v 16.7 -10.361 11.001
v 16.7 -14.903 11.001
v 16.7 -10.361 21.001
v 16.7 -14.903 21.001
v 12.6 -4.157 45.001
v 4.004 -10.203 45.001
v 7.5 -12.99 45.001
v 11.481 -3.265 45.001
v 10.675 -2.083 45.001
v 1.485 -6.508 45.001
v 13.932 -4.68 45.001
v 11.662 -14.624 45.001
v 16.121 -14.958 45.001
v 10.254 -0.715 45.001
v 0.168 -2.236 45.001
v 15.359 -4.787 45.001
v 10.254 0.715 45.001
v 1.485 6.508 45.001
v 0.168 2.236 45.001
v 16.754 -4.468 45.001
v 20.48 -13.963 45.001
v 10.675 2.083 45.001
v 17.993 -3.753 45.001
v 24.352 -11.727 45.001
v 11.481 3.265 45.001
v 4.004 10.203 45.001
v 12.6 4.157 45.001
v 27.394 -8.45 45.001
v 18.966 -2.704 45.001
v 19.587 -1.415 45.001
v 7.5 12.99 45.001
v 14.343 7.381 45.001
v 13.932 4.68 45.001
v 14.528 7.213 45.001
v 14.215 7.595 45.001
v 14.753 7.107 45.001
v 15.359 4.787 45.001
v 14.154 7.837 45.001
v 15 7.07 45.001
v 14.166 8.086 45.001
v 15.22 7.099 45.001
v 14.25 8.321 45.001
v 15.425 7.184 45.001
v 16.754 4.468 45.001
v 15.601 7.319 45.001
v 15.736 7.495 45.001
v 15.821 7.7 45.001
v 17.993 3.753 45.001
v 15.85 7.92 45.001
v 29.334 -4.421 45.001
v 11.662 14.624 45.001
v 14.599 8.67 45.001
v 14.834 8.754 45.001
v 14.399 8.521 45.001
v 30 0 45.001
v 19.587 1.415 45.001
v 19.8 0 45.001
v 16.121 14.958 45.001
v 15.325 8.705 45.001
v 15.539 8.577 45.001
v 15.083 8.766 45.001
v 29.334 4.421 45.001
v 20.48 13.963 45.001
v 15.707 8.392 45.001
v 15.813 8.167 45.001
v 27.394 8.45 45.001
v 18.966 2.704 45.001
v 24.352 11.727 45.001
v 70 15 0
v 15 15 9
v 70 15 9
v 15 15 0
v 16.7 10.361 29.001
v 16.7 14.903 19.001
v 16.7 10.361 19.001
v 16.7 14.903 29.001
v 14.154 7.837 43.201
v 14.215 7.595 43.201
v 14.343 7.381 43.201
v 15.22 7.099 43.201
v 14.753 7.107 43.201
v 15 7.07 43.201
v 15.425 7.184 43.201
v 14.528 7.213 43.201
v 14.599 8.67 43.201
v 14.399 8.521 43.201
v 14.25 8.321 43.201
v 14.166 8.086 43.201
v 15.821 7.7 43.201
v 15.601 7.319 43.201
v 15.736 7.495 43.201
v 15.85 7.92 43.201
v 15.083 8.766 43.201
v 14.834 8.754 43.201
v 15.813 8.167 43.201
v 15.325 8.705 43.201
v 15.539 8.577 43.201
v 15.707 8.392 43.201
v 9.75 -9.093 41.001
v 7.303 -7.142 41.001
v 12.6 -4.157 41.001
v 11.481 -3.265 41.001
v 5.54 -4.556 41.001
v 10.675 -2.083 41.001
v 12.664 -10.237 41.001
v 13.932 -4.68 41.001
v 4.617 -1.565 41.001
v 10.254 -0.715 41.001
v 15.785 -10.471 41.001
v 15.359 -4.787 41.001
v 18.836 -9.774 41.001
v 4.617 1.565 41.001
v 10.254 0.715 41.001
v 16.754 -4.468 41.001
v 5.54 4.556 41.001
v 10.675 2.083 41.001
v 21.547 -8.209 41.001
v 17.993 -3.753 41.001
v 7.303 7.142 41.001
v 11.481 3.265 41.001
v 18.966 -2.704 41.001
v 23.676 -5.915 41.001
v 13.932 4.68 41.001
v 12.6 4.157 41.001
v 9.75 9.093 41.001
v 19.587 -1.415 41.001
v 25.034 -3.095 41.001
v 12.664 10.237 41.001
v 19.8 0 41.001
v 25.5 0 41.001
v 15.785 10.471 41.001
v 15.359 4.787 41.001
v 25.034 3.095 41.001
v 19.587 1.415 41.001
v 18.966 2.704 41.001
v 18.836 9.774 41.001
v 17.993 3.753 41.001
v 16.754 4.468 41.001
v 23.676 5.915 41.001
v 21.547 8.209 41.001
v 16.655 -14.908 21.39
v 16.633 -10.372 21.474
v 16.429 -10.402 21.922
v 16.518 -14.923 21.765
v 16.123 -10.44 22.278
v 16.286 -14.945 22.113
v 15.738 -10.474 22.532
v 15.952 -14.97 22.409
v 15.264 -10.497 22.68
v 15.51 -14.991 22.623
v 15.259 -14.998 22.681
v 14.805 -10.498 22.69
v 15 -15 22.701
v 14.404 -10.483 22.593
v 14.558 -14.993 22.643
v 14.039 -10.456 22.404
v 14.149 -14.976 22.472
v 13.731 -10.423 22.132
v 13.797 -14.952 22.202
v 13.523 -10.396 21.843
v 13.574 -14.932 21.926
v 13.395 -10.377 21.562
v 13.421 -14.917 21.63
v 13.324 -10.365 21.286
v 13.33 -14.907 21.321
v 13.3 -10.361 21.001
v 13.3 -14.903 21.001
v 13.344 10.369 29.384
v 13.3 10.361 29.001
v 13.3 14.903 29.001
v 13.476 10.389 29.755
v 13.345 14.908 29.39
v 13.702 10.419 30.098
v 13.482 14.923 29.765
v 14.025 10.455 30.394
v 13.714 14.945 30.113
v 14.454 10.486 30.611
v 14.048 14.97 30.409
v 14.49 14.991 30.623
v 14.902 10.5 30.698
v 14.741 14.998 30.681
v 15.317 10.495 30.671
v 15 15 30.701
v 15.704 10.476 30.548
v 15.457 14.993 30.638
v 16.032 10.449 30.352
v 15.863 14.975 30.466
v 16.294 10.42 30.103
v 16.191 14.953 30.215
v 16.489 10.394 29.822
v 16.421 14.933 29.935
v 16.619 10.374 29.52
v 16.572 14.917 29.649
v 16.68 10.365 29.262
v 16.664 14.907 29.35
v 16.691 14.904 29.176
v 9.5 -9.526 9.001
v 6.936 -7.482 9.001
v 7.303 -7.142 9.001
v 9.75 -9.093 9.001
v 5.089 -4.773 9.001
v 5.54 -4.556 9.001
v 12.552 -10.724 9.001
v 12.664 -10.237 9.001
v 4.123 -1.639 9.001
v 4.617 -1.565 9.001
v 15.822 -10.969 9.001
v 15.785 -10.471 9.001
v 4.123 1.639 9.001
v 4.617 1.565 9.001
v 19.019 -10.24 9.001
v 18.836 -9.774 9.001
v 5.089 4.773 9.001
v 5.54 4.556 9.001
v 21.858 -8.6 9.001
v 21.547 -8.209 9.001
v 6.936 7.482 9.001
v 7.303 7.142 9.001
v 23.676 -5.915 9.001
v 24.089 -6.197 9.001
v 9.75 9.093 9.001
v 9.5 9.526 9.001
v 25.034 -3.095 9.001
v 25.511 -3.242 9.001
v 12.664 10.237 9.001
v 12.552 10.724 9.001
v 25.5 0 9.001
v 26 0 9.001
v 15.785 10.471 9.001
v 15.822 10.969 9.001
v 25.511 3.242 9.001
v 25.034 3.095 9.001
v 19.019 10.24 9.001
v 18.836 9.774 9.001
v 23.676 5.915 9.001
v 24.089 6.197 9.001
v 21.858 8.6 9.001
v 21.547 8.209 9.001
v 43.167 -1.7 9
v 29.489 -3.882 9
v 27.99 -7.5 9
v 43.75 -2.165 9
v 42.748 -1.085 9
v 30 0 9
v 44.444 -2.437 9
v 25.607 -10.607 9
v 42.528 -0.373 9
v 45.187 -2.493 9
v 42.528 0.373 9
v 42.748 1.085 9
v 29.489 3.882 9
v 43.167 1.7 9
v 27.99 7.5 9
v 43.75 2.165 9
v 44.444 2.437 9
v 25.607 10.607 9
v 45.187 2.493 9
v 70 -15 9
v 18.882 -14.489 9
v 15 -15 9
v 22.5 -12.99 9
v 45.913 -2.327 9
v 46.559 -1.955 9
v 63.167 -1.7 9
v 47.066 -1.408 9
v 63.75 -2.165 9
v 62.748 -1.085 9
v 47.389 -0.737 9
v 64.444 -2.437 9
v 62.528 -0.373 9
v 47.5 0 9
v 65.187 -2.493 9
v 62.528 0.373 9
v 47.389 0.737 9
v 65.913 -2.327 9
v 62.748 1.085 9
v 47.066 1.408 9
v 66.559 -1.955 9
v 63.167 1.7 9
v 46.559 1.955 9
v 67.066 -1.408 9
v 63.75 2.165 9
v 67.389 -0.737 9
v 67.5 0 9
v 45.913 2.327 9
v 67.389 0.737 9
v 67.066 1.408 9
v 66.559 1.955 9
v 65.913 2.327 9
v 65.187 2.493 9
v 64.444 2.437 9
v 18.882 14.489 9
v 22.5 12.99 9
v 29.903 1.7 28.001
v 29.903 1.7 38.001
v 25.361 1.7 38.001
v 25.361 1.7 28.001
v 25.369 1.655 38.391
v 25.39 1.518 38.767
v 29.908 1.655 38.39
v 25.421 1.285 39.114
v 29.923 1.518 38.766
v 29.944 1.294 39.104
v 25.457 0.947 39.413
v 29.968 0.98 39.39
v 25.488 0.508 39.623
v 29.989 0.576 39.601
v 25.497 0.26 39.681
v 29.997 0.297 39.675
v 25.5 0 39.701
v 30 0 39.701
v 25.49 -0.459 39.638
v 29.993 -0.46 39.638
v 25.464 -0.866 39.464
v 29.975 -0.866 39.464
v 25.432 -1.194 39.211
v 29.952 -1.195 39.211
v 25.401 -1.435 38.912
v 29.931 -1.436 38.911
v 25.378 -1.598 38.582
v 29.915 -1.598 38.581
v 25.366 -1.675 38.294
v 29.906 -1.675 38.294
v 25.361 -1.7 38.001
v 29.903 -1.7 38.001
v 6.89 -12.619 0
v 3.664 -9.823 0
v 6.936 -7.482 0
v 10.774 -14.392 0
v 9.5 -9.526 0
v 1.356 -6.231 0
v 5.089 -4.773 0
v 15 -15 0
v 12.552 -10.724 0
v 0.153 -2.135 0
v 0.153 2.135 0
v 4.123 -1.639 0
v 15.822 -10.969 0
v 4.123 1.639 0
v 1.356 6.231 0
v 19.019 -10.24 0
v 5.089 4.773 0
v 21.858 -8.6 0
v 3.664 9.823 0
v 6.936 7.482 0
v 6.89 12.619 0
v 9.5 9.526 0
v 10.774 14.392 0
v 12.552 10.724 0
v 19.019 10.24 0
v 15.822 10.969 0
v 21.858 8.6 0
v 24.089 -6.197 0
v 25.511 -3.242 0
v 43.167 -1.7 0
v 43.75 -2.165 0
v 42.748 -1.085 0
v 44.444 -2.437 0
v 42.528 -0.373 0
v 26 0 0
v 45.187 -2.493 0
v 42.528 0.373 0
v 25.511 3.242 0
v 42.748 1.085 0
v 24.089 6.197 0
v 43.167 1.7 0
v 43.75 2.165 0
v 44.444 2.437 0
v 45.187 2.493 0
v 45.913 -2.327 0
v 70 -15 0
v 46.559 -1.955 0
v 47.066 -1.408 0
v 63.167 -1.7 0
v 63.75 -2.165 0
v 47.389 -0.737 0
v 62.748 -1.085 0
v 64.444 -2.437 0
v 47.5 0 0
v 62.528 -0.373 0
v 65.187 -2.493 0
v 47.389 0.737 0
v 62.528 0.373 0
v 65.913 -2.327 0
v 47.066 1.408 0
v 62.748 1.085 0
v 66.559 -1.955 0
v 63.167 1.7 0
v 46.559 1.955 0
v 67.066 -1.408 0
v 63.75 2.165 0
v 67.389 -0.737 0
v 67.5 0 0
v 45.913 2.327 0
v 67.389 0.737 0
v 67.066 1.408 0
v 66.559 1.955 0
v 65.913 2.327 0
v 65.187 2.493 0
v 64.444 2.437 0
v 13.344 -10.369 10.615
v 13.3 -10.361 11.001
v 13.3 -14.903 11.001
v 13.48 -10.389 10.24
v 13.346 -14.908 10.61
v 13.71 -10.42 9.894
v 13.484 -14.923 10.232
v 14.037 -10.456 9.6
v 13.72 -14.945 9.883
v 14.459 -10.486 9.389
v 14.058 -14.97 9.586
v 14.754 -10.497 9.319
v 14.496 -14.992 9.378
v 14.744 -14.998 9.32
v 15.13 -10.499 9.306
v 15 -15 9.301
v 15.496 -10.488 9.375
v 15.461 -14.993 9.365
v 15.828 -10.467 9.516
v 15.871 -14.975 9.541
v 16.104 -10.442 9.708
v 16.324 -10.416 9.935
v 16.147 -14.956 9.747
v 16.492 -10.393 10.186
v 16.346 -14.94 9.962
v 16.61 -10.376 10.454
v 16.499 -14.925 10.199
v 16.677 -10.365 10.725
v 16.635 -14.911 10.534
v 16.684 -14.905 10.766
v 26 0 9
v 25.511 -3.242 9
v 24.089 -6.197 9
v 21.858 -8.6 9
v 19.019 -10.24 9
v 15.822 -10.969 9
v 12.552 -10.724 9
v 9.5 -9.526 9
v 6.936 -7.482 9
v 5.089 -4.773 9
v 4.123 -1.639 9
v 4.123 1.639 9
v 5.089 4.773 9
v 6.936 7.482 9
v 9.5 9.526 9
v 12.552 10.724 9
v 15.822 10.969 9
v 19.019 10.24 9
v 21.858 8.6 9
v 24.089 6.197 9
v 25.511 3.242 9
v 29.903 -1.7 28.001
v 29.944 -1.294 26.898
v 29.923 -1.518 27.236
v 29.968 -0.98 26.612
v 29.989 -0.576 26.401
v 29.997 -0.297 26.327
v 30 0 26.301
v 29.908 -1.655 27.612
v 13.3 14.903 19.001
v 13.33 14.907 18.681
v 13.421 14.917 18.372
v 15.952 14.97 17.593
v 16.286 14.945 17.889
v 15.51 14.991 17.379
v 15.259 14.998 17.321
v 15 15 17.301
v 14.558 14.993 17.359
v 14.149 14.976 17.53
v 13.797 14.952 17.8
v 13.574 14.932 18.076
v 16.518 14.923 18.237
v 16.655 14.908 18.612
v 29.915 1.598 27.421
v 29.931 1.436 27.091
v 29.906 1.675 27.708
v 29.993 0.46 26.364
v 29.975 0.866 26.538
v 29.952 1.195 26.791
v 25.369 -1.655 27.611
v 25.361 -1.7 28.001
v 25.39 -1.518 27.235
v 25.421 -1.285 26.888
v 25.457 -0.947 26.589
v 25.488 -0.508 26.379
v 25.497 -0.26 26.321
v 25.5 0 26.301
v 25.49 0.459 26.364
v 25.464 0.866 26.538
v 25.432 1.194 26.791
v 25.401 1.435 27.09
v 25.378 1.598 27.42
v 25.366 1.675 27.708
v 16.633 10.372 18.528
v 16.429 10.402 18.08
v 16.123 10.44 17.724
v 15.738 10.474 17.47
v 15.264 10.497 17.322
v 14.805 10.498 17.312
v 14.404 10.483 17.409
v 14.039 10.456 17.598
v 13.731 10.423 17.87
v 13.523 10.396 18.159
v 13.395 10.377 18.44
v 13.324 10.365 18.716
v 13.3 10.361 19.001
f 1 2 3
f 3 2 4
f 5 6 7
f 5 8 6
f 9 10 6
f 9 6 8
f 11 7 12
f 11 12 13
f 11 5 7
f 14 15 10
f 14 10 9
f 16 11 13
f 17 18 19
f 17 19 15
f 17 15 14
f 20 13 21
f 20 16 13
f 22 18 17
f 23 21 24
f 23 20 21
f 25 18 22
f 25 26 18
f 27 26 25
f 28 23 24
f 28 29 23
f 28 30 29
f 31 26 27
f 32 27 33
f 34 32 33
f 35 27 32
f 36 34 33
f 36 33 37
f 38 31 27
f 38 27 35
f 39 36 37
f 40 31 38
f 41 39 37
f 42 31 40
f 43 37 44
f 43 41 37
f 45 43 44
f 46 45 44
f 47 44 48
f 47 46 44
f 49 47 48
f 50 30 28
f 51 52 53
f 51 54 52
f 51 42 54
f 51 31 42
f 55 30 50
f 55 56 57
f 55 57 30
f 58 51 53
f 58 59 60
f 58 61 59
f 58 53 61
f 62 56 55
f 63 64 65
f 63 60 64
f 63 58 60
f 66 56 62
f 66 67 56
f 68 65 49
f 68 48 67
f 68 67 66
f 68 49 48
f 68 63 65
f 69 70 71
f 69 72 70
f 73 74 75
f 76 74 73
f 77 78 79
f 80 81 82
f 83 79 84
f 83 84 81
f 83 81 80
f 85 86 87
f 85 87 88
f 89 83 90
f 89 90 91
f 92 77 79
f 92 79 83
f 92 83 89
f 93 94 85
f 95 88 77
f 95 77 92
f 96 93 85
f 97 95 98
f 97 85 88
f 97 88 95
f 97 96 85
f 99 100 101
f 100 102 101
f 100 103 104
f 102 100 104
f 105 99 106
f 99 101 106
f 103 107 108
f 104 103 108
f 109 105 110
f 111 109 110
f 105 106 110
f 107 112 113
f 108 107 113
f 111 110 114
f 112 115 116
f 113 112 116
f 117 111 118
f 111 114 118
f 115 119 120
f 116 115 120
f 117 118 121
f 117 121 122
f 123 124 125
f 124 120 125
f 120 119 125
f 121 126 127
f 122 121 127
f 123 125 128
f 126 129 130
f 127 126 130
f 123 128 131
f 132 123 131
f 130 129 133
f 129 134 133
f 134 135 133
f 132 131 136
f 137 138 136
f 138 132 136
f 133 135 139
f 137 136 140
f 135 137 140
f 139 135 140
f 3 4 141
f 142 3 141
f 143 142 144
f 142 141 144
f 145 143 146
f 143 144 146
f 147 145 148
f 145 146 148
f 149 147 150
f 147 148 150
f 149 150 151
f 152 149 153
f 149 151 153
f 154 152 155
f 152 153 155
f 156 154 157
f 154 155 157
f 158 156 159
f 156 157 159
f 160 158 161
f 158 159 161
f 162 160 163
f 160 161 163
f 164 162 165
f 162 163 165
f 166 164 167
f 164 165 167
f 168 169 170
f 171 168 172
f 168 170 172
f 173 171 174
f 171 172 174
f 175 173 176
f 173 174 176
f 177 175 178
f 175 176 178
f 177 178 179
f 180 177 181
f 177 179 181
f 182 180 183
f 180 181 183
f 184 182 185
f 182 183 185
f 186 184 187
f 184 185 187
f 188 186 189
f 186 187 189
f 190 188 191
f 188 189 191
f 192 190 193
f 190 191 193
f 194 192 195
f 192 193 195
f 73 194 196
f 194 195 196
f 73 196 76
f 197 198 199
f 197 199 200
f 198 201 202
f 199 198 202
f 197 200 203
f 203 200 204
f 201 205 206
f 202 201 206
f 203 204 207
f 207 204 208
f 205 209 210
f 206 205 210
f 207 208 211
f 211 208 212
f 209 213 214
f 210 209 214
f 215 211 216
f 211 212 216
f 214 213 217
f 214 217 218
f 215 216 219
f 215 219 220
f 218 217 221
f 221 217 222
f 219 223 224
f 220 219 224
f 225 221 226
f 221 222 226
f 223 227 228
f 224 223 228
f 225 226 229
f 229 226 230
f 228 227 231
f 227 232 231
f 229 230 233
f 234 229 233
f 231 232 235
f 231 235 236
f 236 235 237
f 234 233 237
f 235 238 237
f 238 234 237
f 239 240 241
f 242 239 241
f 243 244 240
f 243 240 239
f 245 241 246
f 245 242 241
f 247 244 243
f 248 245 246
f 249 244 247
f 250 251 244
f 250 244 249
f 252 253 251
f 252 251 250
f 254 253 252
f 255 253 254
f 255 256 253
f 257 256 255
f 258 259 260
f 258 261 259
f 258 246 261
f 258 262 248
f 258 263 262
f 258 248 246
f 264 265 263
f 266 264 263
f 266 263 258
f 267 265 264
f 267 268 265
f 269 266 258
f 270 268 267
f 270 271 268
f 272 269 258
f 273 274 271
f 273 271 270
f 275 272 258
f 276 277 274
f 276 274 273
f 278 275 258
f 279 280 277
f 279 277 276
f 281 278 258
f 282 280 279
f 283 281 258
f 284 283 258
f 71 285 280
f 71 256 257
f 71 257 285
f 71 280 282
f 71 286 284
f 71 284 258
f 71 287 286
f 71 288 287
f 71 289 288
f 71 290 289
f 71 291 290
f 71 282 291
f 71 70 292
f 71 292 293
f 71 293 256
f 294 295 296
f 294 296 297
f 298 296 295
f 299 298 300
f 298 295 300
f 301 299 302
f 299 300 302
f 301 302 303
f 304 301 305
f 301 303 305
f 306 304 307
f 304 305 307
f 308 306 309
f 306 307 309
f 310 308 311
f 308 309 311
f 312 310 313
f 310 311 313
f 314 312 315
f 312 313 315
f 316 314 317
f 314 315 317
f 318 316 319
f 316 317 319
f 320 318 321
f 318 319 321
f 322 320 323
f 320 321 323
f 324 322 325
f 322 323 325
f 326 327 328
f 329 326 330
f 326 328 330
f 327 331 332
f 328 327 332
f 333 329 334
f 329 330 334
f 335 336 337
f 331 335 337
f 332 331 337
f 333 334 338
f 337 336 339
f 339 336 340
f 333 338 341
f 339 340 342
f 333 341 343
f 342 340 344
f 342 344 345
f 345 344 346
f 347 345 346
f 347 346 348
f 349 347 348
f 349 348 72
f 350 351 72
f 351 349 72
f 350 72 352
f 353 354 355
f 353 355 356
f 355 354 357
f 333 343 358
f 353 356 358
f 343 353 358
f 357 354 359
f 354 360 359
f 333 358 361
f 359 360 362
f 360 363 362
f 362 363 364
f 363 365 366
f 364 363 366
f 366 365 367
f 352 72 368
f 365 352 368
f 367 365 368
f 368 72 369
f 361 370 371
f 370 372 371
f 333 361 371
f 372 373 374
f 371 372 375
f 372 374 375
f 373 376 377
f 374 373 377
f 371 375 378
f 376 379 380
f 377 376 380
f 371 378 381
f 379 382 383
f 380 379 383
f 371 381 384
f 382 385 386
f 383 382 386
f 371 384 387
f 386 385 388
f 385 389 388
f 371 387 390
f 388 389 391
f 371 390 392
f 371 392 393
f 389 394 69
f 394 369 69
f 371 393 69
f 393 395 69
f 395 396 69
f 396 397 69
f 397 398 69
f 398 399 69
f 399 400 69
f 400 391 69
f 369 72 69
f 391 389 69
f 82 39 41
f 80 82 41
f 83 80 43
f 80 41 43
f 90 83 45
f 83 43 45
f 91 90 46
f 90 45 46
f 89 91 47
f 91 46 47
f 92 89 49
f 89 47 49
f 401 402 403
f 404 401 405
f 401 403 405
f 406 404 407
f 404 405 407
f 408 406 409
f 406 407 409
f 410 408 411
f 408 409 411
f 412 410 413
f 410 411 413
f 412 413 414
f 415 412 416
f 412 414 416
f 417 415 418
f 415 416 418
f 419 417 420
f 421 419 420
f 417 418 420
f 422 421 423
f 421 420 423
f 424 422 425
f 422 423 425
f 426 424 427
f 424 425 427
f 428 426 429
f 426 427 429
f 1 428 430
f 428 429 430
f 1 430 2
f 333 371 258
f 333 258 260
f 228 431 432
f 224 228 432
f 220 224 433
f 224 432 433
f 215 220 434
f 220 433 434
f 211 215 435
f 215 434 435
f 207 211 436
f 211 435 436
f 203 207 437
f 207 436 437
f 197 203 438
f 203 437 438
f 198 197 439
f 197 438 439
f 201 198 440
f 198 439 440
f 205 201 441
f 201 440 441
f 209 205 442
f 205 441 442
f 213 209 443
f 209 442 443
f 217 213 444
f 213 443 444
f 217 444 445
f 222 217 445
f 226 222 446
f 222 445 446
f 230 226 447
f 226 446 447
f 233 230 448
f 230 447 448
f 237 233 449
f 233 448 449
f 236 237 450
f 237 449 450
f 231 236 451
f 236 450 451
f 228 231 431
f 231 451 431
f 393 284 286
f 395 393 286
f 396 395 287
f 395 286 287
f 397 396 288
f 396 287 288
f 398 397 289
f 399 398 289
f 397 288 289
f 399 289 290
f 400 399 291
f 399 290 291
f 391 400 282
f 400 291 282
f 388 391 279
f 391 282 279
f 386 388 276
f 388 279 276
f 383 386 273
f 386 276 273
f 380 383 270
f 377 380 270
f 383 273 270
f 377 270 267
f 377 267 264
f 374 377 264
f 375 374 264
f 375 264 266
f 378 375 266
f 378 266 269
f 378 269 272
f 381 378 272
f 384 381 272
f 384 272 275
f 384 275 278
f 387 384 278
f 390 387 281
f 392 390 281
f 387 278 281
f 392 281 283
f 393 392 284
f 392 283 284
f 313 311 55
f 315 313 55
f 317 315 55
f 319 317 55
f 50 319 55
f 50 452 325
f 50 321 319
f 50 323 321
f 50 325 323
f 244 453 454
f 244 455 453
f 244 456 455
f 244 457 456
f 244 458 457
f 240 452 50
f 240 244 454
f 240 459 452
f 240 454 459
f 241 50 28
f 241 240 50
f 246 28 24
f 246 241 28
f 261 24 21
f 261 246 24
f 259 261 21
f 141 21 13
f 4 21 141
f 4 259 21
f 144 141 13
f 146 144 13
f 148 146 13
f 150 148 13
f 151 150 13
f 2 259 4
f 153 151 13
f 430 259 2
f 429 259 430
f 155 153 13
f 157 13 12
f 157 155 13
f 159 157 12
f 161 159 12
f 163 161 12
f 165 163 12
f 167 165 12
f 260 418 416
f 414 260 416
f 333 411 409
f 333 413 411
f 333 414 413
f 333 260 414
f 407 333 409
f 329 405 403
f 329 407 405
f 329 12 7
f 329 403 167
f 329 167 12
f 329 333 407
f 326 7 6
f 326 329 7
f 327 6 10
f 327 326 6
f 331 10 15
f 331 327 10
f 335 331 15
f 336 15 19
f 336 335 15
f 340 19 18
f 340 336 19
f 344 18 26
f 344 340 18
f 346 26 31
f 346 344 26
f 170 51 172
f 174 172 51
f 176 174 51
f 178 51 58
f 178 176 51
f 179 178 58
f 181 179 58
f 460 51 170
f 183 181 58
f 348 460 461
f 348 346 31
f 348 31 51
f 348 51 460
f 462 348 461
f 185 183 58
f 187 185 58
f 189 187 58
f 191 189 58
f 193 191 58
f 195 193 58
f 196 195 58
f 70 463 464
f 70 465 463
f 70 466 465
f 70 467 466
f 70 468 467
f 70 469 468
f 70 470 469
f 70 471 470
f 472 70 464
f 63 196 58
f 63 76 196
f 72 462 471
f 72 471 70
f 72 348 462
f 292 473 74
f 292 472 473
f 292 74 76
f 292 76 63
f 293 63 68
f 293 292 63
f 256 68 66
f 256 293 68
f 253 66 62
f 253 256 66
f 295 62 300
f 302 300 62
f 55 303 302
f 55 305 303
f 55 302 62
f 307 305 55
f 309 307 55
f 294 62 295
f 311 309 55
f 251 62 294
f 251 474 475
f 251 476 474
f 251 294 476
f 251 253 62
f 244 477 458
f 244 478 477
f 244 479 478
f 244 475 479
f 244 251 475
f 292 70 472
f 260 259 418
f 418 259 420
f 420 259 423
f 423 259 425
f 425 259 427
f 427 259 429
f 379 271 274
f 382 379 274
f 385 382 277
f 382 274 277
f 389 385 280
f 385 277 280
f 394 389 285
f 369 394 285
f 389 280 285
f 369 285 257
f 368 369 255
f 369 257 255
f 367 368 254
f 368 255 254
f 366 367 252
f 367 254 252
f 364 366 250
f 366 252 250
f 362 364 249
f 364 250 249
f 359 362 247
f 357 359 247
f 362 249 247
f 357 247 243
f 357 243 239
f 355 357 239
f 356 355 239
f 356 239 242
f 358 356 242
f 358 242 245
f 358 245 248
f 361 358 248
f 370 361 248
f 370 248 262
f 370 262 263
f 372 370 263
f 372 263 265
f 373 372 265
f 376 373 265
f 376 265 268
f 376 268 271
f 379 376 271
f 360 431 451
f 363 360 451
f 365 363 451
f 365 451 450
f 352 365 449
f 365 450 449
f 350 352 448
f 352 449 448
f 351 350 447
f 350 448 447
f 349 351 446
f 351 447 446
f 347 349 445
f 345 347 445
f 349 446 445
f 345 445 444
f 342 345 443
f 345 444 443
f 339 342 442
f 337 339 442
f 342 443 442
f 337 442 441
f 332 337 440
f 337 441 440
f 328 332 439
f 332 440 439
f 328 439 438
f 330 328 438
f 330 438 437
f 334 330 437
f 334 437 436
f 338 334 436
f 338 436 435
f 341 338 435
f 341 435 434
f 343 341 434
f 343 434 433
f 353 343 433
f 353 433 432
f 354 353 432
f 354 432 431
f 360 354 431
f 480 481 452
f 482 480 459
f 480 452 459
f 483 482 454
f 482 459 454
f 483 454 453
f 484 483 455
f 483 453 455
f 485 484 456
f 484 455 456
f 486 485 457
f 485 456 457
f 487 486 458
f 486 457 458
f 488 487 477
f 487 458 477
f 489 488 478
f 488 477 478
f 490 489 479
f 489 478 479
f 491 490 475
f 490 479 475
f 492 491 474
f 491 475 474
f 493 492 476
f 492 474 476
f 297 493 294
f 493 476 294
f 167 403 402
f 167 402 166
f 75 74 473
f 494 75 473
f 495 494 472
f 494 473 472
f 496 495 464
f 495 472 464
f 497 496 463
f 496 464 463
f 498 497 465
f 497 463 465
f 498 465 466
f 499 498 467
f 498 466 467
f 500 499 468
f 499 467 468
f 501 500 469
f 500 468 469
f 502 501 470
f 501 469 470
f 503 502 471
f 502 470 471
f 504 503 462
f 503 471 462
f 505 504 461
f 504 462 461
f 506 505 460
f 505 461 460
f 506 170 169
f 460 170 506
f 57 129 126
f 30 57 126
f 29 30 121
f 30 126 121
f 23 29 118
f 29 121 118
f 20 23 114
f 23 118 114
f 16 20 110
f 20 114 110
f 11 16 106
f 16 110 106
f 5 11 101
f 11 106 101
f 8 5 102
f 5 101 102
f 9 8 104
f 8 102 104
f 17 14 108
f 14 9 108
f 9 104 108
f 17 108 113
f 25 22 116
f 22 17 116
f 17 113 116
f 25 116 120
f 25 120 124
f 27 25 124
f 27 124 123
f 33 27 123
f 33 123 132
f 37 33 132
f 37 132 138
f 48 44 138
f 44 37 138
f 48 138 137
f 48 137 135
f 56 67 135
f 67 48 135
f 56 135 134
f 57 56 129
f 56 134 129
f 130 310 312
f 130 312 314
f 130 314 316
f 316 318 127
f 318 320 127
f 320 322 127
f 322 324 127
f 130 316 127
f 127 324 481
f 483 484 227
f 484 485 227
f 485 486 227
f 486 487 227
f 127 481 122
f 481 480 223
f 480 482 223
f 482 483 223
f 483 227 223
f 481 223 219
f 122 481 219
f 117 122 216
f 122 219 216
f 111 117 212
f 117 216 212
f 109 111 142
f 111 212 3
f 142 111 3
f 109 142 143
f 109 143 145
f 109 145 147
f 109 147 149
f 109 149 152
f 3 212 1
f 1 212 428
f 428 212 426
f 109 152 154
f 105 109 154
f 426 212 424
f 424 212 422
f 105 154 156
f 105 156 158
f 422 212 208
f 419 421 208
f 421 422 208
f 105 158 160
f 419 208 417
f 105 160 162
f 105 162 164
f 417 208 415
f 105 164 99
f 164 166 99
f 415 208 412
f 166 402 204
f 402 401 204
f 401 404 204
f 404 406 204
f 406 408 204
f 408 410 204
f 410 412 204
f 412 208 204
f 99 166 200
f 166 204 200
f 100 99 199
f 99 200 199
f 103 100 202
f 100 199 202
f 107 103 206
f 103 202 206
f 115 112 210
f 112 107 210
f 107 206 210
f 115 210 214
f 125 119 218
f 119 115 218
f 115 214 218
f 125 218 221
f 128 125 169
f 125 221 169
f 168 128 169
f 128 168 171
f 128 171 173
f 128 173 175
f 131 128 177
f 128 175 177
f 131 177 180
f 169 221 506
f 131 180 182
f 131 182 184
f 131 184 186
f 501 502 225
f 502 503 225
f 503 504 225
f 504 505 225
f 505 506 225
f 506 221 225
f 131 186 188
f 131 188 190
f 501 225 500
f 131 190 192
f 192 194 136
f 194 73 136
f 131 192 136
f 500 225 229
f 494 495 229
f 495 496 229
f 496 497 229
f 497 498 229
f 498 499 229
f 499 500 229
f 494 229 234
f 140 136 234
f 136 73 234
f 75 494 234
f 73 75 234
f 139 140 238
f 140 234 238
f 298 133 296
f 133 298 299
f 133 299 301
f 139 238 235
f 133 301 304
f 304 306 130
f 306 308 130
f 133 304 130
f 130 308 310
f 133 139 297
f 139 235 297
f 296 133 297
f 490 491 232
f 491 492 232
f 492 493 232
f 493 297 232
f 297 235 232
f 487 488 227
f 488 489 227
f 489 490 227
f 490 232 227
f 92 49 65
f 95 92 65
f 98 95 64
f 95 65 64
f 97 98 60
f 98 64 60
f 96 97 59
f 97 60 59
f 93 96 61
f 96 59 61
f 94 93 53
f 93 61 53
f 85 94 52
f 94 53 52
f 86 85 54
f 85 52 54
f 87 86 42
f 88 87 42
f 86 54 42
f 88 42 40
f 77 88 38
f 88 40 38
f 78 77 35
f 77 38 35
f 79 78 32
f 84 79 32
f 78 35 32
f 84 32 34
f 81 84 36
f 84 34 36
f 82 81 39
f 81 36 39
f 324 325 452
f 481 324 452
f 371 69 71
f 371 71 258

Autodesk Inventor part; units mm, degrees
ref_plane "YZ Plane" through (0, 0, 0) normal (1, 0, 0) x (0, 1, 0)
ref_plane "XZ Plane" through (0, 0, 0) normal (0, 1, 0) x (-1, 0, 0)
ref_plane "XY Plane" through (0, 0, 0) normal (0, 0, 1) x (1, 0, 0)
sketch "Sketch1" plane through (0, 0, 0) normal (0, 0, 1) x (1, 0, 0)
  line L0 (15, 15) -> (70, 15)
  line L1 (70, 15) -> (70, -15)
  line L2 (70, -15) -> (15, -15)
  line L3 (-14, 0) -> (84, 0) projected
  arc A0 (15, 15) -> (15, -15) centre (15, 0) ccw
  line L4 (0, -21) -> (0, 21) projected
  line L5 (15, 0) -> (70, 0)
  point P0 (0, 0)
  dimension "d4" = 30
  dimension "d15" = 15
  dimension "d16" = 55
extrude "Extrusion1" add sketch "Sketch1" along normal blind 9
sketch "Sketch2" plane through (0, 0, 9) normal (0, 0, 1) x (1, 0, 0)
  circle A0 centre (15, 0) radius 11
  arc A1 (15, 15) -> (15, -15) centre (15, 0) ccw projected
  point P0 (0, 0)
  dimension "d7" = 22
extrude "Extrusion2" cut sketch "Sketch2" against normal blind 10
sketch "Sketch3" plane through (0, 0, 9) normal (0, 0, 1) x (1, 0, 0)
  circle A0 centre (45, 0) radius 2.5
  circle A1 centre (65, 0) radius 2.5
  line L0 (70, -15) -> (70, 15) projected
  point P0 (0, 0)
  dimension "d28" = 3.4
  dimension "d29" = 7
  dimension "d30" = 10
  dimension "d31" = 15
  dimension "d10" = 5
  dimension "d11" = 5
  dimension "d12" = 25
extrude "Extrusion3" cut sketch "Sketch3" against normal blind 25
sketch "Sketch4" plane through (0, 0, 9) normal (0, 0, 1) x (1, 0, 0)
  circle A0 centre (15, 0) radius 15
  circle A1 centre (15, 0) radius 11
  circle A2 centre (15, 0) radius 11 projected
  arc A3 (15, 15) -> (15, -15) centre (15, 0) ccw projected
  point P0 (0, 0)
extrude "Extrusion4" add sketch "Sketch4" along normal blind 0.001
sketch "Sketch5" plane through (15, 0, 9.001) normal (0, 0, 1) x (1, 0, 0)
  circle A0 centre (0, 0) radius 15
  circle A1 centre (0, 0) radius 10.5
  circle A2 centre (0, 0) radius 15 projected
  point P0 (-15, 0)
  dimension "d19" = 21
extrude "Extrusion5" add sketch "Sketch5" along normal blind 32
sketch "Sketch6" plane through (15, 0, 41.001) normal (0, 0, 1) x (1, 0, 0)
  circle A0 centre (0, 0) radius 4.8
  circle A1 centre (0, 0) radius 15
  circle A2 centre (0, 0) radius 15 projected
  point P0 (-15, 0)
  dimension "d22" = 9.6
extrude "Extrusion6" add sketch "Sketch6" along normal blind 4
sketch "Sketch7" plane through (70, -15, 0) normal (1, 0, 0) x (0, 0, -1)
  line L0 (-45.001, 30) -> (-45.001, 0) projected
  arc A0 (-38.001, 16.7) -> (-38.001, 13.3) centre (-38.001, 15) ccw
  line L1 (-38.001, 16.7) -> (-28.001, 16.7)
  arc A1 (-28.001, 13.3) -> (-28.001, 16.7) centre (-28.001, 15) ccw
  line L2 (-38.001, 13.3) -> (-28.001, 13.3)
  line L3 (-9, 0) -> (-9, 30) projected
  line L4 (0, 0) -> (-9, 0) projected
  point P0 (0, 15)
  dimension "d28" = 3.4
  dimension "d29" = 7
  dimension "d30" = 10
  dimension "d31" = 15
extrude "Extrusion7" cut sketch "Sketch7" against normal blind 50
sketch "Sketch8" plane through (15, 15, 0) normal (0, 1, 0) x (1, 0, 0)
  arc A0 (-1.7, -29.001) -> (1.7, -29.001) centre (0, -29.001) ccw
  arc A1 (1.7, -19.001) -> (-1.7, -19.001) centre (0, -19.001) ccw
  line L0 (-1.7, -29.001) -> (-1.7, -19.001)
  line L1 (1.7, -19.001) -> (1.7, -29.001)
  line L2 (0, -29.001) -> (0, -19.001)
  line L3 (55, -9) -> (0, -9) projected
  line L4 (55, 0) -> (55, -9) projected
  line L5 (-15, -45.001) -> (15, -45.001) projected
  point P0 (-15, 0)
  dimension "d34" = 55
  dimension "d35" = 3.4
  dimension "d36" = 16
  dimension "d37" = 10
extrude "Extrusion8" cut sketch "Sketch8" against normal blind 20
sketch "Sketch9" plane through (15, -15, 0) normal (0, -1, 0) x (1, 0, 0)
  arc A0 (-1.7, 11.001) -> (1.7, 11.001) centre (0, 11.001) ccw
  line L0 (-1.7, 11.001) -> (-1.7, 21.001)
  line L1 (1.7, 11.001) -> (1.7, 21.001)
  arc A1 (1.7, 21.001) -> (-1.7, 21.001) centre (0, 21.001) ccw
  line L2 (15, 45.001) -> (-15, 45.001) projected
  line L3 (55, 0) -> (55, 9) projected
  point P0 (-15, 0)
  dimension "d40" = 24
  dimension "d41" = 10
  dimension "d42" = 3.4
  dimension "d43" = 55
extrude "Extrusion9" cut sketch "Sketch9" against normal blind 20
sketch "Sketch10" plane through (15, 0, 45.001) normal (0, 0, 1) x (1, 0, 0)
  circle A0 centre (0, 7.92) radius 0.85
  circle A1 centre (0, 0) radius 15 projected
  line L0 (0, 7.92) -> (0, 0)
  point P0 (-15, 0)
  dimension "d46" = 1.7
  dimension "d47" = 7.92
extrude "Extrusion10" cut sketch "Sketch10" against normal blind 1.8 contours A0
equation "\"d13\" = d12"
properties part number "bearing_mount3"
